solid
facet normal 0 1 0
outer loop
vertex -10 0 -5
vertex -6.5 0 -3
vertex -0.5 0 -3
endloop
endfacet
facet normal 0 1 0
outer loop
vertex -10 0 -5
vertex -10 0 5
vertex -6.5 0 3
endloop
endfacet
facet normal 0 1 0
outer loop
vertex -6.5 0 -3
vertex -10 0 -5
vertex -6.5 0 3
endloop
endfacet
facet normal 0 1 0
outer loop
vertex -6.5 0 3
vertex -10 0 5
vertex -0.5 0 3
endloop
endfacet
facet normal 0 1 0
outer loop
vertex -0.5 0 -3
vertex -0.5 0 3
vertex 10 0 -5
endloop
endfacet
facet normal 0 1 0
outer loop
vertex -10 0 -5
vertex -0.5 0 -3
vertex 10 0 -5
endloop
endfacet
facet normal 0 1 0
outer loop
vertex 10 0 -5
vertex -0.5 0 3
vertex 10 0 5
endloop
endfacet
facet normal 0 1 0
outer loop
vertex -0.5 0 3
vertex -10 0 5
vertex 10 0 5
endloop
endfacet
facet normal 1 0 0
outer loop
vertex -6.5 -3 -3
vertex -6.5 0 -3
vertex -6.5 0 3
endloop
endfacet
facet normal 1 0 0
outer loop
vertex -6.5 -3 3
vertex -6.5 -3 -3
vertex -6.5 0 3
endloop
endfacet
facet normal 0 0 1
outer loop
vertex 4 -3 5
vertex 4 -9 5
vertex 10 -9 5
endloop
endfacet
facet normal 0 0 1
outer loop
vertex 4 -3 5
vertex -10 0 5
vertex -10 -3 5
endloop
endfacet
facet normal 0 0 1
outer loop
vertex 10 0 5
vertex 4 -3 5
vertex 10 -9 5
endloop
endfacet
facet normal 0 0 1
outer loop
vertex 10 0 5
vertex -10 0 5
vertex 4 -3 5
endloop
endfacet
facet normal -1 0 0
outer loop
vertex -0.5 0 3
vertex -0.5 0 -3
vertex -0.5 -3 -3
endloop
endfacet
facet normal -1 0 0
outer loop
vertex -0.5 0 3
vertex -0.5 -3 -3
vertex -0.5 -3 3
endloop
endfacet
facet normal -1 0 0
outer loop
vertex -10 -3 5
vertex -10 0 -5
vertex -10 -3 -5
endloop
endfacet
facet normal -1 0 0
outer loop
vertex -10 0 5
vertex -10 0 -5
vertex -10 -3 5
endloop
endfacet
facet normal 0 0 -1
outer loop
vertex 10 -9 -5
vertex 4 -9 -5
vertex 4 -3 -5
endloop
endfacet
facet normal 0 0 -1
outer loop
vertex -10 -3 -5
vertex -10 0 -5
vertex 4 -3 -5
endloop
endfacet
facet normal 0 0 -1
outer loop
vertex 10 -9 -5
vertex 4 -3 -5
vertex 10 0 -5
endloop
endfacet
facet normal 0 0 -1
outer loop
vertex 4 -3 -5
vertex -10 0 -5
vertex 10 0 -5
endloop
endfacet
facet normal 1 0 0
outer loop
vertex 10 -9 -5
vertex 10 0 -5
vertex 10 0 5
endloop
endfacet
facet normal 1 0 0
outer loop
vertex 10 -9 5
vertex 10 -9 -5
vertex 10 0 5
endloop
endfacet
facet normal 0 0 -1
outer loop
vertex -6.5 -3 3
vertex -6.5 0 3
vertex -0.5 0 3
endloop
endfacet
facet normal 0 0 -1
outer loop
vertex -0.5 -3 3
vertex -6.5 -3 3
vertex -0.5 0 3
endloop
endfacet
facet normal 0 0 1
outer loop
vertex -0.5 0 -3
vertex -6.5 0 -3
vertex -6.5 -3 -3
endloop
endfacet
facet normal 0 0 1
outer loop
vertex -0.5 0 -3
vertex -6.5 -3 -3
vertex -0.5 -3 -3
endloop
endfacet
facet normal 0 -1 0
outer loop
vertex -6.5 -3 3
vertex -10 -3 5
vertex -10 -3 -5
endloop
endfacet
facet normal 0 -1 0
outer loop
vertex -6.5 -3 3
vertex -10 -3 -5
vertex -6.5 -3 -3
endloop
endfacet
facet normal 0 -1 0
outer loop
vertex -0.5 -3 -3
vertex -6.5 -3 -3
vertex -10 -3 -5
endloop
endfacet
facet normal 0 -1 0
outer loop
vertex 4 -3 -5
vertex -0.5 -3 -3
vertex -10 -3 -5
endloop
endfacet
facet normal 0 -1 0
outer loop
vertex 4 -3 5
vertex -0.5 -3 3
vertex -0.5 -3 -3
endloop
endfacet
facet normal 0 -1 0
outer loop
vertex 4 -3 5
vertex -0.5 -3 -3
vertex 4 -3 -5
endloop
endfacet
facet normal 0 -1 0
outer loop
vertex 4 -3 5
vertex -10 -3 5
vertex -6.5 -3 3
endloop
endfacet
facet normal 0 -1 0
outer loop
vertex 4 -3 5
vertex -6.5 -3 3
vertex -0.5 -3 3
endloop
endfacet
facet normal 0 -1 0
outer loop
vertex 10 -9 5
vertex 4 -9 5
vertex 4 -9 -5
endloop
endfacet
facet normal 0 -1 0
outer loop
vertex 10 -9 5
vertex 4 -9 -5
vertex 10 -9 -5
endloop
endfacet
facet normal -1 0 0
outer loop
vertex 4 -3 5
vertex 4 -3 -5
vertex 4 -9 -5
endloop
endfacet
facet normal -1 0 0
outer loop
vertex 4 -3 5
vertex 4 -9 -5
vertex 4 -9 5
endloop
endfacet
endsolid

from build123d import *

# Parameters (mm, degrees)
F0_W     = 14
F0_H     = 10
F0_W_2   = 6
F0_H_2   = 6
F1_DEPTH = 3
F2_DEPTH = 9


with BuildPart() as f1:
    # F0 (on Front) → F1 (new body)
    with BuildSketch(Plane.XZ):
        with Locations((-3, 0)):
            Rectangle(F0_W, F0_H)
        with Locations((-3.5, 0)):
            Rectangle(F0_W_2, F0_H_2, mode=Mode.SUBTRACT)
    extrude(amount=F1_DEPTH)

    # F0 (on Front) → F2 (join)
    with BuildSketch(Plane.XZ):
        with Locations((7, 0)):
            Rectangle(F0_W_2, F0_H)
    extrude(amount=F2_DEPTH)


solid = f1.part
